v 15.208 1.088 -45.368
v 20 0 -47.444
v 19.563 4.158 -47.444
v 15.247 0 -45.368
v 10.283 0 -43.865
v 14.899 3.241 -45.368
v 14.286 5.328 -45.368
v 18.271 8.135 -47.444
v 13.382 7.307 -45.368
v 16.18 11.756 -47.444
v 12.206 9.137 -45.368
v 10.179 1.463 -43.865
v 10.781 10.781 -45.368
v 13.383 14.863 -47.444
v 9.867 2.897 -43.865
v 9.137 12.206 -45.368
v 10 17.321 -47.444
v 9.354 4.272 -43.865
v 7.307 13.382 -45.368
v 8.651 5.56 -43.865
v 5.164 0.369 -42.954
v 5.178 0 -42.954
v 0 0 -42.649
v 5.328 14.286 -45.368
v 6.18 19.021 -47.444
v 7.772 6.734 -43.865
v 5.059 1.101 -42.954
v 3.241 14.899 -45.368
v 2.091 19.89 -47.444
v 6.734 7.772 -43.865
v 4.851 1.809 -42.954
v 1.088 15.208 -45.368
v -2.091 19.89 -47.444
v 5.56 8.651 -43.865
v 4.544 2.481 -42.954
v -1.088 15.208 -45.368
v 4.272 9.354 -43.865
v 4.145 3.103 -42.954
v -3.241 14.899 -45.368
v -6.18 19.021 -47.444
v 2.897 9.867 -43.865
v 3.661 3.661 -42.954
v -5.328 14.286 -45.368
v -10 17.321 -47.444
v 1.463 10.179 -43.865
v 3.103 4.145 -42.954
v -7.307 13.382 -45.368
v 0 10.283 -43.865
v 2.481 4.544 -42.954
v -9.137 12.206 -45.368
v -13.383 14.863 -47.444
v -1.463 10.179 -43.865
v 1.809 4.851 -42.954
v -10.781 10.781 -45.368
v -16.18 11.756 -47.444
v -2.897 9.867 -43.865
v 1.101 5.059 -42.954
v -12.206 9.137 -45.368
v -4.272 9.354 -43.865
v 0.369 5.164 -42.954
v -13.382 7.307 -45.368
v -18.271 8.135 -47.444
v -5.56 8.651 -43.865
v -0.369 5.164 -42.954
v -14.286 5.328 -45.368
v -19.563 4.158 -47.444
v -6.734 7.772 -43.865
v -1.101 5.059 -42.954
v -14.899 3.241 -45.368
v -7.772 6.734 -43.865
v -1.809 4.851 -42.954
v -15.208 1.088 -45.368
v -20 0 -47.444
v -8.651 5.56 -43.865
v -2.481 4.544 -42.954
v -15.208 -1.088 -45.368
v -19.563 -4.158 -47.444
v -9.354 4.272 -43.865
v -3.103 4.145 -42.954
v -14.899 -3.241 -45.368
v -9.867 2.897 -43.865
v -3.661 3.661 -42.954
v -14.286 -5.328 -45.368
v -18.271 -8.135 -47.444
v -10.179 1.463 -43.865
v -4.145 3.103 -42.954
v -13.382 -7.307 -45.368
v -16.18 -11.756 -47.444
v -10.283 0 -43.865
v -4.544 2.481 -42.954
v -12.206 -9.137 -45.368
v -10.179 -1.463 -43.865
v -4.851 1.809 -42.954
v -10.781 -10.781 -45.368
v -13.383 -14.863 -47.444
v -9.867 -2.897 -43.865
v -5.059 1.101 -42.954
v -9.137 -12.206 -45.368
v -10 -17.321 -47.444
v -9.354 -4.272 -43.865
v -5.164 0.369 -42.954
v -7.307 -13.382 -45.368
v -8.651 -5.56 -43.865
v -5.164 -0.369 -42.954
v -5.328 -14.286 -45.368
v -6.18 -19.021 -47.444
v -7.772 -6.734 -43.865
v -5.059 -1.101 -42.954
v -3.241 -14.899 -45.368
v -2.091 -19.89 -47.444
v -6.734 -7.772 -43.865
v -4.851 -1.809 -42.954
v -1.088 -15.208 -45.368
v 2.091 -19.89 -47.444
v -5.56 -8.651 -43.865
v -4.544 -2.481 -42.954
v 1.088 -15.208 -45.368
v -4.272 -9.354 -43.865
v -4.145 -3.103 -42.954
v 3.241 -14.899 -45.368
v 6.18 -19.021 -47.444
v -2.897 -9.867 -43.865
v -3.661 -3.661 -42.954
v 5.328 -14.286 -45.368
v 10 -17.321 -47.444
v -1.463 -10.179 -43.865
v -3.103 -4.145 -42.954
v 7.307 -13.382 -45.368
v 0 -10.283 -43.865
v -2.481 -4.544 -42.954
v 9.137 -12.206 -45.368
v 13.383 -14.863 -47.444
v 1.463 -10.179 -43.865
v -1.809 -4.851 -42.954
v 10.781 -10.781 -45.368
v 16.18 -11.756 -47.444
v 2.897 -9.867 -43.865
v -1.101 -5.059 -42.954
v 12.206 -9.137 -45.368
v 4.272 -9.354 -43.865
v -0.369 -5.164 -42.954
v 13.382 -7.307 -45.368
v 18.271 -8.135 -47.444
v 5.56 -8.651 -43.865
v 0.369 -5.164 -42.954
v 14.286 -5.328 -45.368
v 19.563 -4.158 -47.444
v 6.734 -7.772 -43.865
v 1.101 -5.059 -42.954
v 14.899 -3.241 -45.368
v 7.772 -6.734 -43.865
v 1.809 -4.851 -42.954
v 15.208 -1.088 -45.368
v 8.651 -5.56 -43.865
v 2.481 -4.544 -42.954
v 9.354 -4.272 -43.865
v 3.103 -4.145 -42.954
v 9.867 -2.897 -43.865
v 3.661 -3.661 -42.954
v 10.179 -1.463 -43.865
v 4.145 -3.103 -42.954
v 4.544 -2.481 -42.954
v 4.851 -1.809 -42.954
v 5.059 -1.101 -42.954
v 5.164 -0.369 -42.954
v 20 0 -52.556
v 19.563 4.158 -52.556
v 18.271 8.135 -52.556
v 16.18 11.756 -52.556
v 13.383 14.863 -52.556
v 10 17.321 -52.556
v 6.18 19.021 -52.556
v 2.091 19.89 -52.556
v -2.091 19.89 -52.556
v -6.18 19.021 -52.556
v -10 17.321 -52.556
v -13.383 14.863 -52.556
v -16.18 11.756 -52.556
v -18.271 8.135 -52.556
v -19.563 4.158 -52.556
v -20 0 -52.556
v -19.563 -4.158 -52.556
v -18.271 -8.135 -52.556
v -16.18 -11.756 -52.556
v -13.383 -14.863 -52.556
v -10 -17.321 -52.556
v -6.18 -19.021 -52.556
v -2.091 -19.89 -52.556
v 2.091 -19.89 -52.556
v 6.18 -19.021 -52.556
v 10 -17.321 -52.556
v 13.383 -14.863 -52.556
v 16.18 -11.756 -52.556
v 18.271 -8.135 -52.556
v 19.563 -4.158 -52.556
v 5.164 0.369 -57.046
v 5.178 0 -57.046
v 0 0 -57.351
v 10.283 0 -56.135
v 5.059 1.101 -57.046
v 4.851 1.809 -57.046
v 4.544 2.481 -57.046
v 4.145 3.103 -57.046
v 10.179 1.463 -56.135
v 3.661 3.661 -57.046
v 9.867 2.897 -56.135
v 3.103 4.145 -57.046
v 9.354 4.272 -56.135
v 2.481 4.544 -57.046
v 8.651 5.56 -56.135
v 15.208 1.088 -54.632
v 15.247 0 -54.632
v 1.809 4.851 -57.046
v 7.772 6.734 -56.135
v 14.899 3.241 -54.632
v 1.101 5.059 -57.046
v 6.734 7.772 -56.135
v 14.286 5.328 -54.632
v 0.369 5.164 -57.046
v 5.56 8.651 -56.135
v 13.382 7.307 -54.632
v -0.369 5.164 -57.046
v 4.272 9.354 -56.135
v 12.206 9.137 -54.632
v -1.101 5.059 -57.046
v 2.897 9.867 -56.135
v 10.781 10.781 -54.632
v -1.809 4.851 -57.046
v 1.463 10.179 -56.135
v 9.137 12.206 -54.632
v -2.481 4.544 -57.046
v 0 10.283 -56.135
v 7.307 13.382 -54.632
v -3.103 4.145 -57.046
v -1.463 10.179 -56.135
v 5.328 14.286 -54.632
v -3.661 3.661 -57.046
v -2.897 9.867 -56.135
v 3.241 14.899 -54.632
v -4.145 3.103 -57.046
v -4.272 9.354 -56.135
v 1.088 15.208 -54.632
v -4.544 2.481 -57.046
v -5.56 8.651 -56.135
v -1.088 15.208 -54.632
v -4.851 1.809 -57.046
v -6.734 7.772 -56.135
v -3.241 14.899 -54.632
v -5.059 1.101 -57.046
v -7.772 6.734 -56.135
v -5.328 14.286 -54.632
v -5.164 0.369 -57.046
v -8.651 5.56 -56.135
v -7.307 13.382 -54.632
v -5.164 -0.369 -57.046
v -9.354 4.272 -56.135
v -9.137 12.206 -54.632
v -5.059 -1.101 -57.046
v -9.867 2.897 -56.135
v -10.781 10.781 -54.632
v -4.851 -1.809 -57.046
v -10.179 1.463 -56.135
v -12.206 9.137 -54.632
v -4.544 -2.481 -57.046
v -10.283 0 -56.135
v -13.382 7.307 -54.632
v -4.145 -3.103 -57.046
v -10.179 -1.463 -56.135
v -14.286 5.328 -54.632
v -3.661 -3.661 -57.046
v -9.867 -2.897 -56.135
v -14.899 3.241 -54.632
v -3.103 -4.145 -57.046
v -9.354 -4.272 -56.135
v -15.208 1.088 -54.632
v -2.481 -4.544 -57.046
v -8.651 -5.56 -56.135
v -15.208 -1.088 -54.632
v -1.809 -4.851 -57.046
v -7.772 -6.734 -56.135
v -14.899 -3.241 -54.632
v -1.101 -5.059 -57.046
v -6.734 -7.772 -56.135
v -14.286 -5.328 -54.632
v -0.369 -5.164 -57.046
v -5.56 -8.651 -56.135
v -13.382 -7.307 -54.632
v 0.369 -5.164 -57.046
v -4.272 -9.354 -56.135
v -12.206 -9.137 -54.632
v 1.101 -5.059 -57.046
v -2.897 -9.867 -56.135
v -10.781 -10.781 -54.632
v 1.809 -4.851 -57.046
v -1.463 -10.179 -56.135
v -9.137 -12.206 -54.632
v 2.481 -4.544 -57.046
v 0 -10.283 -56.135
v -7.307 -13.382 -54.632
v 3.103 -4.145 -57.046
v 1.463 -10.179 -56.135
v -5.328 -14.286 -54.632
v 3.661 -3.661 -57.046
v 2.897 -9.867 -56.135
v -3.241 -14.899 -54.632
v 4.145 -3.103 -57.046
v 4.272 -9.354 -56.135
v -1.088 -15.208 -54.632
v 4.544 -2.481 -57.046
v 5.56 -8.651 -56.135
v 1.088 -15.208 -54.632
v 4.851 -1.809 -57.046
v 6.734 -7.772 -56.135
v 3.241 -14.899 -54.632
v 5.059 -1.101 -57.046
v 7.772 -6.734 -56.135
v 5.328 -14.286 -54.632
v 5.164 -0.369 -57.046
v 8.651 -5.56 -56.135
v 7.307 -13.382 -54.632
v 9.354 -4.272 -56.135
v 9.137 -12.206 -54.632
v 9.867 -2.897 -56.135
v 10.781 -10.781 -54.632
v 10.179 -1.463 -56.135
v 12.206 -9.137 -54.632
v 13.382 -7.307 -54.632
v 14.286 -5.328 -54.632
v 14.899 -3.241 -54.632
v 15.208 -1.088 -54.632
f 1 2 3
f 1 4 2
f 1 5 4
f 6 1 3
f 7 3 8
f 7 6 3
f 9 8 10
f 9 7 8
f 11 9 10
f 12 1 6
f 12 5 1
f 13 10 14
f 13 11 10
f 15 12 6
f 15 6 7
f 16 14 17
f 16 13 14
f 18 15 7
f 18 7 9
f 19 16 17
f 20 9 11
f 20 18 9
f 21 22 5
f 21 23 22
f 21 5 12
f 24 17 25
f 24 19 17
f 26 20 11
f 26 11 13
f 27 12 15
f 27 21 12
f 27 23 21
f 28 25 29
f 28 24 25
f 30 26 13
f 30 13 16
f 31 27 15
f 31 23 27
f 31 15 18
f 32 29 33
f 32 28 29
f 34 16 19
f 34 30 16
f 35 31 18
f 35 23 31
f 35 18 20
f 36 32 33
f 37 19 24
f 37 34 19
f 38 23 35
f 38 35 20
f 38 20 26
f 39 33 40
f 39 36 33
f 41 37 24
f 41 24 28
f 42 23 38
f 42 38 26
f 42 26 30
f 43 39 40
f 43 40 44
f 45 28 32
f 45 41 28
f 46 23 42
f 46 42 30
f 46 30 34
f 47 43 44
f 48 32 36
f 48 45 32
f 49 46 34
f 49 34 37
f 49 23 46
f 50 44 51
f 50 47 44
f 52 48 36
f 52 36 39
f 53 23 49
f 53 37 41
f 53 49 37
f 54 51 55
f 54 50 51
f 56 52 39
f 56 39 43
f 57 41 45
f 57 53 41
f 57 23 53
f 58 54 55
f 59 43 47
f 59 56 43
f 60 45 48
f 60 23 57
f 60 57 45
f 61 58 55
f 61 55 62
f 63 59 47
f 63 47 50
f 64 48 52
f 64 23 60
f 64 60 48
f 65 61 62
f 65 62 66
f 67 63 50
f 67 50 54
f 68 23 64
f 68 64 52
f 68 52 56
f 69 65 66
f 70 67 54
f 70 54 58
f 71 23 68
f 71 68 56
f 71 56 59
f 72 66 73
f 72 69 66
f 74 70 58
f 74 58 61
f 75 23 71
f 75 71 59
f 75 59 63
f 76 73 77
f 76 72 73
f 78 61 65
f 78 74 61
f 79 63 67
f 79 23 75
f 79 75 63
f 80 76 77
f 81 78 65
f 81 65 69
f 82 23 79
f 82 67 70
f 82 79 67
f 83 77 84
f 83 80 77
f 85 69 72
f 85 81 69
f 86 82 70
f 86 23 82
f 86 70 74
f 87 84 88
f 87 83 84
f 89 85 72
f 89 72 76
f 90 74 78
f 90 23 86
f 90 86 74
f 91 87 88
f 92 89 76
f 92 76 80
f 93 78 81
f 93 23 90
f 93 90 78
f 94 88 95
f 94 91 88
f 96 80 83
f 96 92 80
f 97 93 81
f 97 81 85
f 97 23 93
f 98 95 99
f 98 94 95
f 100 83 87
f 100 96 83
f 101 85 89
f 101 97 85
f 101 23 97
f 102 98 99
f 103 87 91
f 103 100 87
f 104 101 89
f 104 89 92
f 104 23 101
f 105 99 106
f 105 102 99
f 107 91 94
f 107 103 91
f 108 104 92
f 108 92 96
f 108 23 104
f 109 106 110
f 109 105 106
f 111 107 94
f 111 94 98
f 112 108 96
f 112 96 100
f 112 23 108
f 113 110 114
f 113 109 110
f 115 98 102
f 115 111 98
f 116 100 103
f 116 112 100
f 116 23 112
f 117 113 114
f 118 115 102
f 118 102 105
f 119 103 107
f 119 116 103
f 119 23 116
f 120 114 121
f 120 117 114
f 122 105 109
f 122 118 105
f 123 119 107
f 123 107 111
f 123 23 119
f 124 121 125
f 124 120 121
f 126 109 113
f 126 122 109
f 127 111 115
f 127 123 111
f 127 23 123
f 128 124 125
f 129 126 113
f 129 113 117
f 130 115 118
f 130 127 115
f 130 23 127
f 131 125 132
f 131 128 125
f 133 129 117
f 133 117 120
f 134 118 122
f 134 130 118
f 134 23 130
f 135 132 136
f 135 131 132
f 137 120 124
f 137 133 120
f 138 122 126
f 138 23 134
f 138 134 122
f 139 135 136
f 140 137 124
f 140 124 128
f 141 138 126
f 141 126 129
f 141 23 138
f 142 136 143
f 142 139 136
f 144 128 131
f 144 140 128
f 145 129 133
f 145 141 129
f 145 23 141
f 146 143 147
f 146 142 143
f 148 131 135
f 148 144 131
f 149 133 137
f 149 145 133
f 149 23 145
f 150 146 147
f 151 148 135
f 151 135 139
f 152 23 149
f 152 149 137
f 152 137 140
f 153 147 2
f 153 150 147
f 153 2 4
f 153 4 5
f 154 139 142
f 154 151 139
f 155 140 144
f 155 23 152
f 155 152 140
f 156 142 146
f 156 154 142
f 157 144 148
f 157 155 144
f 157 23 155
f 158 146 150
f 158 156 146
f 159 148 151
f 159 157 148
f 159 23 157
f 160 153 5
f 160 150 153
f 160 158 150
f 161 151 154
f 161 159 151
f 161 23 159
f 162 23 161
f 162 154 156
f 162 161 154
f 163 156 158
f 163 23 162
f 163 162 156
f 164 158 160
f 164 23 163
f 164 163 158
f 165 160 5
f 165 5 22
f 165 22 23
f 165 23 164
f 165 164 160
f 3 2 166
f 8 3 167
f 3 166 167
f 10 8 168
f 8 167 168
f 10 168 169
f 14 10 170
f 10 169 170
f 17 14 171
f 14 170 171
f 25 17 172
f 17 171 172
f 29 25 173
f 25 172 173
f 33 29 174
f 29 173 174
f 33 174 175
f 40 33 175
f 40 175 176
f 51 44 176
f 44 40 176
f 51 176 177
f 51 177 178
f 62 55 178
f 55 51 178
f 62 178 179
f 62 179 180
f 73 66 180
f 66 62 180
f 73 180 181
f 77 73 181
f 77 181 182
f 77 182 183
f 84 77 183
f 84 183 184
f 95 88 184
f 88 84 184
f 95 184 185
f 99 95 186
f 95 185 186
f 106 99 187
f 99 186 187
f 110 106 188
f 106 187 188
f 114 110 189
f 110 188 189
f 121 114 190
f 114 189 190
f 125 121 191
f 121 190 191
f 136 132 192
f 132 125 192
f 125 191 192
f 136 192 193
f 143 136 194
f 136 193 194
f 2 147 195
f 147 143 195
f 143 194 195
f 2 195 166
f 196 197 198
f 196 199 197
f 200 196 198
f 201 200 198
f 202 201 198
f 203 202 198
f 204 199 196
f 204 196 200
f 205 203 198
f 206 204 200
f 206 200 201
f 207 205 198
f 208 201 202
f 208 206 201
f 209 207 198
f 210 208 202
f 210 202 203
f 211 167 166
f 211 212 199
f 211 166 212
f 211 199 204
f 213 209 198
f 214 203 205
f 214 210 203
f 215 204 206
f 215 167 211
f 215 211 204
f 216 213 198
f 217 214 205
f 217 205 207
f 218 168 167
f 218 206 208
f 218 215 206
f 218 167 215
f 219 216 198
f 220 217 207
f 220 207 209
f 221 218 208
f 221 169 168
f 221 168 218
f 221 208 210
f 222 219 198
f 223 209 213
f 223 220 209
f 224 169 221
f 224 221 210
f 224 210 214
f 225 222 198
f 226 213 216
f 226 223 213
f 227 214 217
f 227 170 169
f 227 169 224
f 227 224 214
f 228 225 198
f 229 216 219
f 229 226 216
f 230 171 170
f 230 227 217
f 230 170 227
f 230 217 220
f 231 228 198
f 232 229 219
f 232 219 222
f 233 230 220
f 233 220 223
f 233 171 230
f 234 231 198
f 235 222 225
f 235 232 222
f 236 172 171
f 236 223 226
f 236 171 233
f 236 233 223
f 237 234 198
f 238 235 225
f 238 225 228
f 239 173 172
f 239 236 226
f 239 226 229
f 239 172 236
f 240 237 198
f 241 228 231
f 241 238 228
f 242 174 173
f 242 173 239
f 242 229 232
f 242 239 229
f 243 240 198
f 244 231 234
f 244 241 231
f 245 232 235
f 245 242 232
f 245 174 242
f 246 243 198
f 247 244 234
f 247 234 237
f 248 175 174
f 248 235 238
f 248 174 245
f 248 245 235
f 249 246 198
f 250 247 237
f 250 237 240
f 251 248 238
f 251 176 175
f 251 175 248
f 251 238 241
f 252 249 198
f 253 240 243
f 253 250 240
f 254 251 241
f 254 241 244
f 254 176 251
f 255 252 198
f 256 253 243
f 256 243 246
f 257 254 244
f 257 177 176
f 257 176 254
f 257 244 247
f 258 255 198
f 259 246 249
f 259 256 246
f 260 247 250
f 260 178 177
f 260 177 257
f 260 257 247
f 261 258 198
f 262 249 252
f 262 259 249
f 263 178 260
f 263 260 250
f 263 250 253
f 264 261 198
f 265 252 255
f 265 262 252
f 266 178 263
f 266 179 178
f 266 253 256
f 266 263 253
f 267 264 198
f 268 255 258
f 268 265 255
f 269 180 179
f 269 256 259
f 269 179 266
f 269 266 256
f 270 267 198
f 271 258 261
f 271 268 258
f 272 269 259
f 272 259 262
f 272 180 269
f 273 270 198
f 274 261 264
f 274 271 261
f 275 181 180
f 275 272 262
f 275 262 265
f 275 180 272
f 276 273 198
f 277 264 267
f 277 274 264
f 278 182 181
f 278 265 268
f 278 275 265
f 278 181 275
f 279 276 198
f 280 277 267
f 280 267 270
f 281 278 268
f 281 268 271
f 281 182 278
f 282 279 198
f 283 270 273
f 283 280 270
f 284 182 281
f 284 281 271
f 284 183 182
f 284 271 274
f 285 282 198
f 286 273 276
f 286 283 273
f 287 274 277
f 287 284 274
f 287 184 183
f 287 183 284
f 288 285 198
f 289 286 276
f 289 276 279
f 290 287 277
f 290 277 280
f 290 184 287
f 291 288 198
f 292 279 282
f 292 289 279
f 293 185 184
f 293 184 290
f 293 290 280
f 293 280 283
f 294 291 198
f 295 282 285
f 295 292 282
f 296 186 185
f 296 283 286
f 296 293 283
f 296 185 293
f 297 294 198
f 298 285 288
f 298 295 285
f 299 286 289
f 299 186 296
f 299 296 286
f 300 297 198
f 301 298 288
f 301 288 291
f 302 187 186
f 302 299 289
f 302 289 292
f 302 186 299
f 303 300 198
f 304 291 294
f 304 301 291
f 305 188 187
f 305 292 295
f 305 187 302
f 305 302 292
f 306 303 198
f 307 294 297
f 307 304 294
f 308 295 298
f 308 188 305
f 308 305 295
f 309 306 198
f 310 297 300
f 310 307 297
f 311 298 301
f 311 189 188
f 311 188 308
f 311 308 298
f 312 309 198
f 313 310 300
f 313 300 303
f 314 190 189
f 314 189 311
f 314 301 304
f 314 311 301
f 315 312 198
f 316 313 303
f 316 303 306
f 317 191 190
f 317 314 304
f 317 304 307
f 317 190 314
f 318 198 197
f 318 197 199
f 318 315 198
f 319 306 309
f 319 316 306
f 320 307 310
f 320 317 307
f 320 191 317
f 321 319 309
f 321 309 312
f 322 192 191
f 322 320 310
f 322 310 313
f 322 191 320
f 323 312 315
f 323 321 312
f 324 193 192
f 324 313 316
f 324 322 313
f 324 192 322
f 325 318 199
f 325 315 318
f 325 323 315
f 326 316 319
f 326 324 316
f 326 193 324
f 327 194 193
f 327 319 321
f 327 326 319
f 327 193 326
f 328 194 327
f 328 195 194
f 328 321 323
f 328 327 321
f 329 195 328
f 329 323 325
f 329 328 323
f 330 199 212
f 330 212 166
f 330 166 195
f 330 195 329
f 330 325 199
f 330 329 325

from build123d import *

# Parameters (mm, degrees)
CYLINDER_R     = 20
CYLINDER_DEPTH = 200


with BuildPart() as cylinder:
    # Cylinder → Cylinder (new body)
    with BuildSketch(Plane.XY.offset(-100)):
        Circle(CYLINDER_R)
    extrude(amount=CYLINDER_DEPTH)


with BuildPart() as sphere001:
    # Sphere001 → Sphere001 (revolve)
    with BuildSketch(Plane(origin=(0, 0, -36.754386), x_dir=(1, 0, 0), z_dir=(0, -1, 0))):
        with BuildLine():
            ThreePointArc((0, -44.105263), (44.105263, 0), (0, 44.105263))
            Line((0, 44.105263), (0, -44.105263))
        make_face()
    revolve(axis=Axis((0, 0, -36.754386), (0, 0, 1)))


with BuildPart() as common001:
    # Sphere → Sphere (revolve)
    with BuildSketch(Plane(origin=(0, 0, 36.754386), x_dir=(1, 0, 0), z_dir=(0, -1, 0))):
        with BuildLine():
            ThreePointArc((0, -44.105263), (44.105263, 0), (0, 44.105263))
            Line((0, 44.105263), (0, -44.105263))
        make_face()
    revolve(axis=Axis((0, 0, 36.754386), (0, 0, 1)))

    # Common: intersect Sphere001
    add(sphere001.part, mode=Mode.INTERSECT)

    # Common001: intersect Cylinder
    add(cylinder.part, mode=Mode.INTERSECT)


with BuildPart() as common001_1:
    # Common001 placement: moved
    add(common001.part.moved(Location((0, 0, -50))))


solid = common001_1.part
